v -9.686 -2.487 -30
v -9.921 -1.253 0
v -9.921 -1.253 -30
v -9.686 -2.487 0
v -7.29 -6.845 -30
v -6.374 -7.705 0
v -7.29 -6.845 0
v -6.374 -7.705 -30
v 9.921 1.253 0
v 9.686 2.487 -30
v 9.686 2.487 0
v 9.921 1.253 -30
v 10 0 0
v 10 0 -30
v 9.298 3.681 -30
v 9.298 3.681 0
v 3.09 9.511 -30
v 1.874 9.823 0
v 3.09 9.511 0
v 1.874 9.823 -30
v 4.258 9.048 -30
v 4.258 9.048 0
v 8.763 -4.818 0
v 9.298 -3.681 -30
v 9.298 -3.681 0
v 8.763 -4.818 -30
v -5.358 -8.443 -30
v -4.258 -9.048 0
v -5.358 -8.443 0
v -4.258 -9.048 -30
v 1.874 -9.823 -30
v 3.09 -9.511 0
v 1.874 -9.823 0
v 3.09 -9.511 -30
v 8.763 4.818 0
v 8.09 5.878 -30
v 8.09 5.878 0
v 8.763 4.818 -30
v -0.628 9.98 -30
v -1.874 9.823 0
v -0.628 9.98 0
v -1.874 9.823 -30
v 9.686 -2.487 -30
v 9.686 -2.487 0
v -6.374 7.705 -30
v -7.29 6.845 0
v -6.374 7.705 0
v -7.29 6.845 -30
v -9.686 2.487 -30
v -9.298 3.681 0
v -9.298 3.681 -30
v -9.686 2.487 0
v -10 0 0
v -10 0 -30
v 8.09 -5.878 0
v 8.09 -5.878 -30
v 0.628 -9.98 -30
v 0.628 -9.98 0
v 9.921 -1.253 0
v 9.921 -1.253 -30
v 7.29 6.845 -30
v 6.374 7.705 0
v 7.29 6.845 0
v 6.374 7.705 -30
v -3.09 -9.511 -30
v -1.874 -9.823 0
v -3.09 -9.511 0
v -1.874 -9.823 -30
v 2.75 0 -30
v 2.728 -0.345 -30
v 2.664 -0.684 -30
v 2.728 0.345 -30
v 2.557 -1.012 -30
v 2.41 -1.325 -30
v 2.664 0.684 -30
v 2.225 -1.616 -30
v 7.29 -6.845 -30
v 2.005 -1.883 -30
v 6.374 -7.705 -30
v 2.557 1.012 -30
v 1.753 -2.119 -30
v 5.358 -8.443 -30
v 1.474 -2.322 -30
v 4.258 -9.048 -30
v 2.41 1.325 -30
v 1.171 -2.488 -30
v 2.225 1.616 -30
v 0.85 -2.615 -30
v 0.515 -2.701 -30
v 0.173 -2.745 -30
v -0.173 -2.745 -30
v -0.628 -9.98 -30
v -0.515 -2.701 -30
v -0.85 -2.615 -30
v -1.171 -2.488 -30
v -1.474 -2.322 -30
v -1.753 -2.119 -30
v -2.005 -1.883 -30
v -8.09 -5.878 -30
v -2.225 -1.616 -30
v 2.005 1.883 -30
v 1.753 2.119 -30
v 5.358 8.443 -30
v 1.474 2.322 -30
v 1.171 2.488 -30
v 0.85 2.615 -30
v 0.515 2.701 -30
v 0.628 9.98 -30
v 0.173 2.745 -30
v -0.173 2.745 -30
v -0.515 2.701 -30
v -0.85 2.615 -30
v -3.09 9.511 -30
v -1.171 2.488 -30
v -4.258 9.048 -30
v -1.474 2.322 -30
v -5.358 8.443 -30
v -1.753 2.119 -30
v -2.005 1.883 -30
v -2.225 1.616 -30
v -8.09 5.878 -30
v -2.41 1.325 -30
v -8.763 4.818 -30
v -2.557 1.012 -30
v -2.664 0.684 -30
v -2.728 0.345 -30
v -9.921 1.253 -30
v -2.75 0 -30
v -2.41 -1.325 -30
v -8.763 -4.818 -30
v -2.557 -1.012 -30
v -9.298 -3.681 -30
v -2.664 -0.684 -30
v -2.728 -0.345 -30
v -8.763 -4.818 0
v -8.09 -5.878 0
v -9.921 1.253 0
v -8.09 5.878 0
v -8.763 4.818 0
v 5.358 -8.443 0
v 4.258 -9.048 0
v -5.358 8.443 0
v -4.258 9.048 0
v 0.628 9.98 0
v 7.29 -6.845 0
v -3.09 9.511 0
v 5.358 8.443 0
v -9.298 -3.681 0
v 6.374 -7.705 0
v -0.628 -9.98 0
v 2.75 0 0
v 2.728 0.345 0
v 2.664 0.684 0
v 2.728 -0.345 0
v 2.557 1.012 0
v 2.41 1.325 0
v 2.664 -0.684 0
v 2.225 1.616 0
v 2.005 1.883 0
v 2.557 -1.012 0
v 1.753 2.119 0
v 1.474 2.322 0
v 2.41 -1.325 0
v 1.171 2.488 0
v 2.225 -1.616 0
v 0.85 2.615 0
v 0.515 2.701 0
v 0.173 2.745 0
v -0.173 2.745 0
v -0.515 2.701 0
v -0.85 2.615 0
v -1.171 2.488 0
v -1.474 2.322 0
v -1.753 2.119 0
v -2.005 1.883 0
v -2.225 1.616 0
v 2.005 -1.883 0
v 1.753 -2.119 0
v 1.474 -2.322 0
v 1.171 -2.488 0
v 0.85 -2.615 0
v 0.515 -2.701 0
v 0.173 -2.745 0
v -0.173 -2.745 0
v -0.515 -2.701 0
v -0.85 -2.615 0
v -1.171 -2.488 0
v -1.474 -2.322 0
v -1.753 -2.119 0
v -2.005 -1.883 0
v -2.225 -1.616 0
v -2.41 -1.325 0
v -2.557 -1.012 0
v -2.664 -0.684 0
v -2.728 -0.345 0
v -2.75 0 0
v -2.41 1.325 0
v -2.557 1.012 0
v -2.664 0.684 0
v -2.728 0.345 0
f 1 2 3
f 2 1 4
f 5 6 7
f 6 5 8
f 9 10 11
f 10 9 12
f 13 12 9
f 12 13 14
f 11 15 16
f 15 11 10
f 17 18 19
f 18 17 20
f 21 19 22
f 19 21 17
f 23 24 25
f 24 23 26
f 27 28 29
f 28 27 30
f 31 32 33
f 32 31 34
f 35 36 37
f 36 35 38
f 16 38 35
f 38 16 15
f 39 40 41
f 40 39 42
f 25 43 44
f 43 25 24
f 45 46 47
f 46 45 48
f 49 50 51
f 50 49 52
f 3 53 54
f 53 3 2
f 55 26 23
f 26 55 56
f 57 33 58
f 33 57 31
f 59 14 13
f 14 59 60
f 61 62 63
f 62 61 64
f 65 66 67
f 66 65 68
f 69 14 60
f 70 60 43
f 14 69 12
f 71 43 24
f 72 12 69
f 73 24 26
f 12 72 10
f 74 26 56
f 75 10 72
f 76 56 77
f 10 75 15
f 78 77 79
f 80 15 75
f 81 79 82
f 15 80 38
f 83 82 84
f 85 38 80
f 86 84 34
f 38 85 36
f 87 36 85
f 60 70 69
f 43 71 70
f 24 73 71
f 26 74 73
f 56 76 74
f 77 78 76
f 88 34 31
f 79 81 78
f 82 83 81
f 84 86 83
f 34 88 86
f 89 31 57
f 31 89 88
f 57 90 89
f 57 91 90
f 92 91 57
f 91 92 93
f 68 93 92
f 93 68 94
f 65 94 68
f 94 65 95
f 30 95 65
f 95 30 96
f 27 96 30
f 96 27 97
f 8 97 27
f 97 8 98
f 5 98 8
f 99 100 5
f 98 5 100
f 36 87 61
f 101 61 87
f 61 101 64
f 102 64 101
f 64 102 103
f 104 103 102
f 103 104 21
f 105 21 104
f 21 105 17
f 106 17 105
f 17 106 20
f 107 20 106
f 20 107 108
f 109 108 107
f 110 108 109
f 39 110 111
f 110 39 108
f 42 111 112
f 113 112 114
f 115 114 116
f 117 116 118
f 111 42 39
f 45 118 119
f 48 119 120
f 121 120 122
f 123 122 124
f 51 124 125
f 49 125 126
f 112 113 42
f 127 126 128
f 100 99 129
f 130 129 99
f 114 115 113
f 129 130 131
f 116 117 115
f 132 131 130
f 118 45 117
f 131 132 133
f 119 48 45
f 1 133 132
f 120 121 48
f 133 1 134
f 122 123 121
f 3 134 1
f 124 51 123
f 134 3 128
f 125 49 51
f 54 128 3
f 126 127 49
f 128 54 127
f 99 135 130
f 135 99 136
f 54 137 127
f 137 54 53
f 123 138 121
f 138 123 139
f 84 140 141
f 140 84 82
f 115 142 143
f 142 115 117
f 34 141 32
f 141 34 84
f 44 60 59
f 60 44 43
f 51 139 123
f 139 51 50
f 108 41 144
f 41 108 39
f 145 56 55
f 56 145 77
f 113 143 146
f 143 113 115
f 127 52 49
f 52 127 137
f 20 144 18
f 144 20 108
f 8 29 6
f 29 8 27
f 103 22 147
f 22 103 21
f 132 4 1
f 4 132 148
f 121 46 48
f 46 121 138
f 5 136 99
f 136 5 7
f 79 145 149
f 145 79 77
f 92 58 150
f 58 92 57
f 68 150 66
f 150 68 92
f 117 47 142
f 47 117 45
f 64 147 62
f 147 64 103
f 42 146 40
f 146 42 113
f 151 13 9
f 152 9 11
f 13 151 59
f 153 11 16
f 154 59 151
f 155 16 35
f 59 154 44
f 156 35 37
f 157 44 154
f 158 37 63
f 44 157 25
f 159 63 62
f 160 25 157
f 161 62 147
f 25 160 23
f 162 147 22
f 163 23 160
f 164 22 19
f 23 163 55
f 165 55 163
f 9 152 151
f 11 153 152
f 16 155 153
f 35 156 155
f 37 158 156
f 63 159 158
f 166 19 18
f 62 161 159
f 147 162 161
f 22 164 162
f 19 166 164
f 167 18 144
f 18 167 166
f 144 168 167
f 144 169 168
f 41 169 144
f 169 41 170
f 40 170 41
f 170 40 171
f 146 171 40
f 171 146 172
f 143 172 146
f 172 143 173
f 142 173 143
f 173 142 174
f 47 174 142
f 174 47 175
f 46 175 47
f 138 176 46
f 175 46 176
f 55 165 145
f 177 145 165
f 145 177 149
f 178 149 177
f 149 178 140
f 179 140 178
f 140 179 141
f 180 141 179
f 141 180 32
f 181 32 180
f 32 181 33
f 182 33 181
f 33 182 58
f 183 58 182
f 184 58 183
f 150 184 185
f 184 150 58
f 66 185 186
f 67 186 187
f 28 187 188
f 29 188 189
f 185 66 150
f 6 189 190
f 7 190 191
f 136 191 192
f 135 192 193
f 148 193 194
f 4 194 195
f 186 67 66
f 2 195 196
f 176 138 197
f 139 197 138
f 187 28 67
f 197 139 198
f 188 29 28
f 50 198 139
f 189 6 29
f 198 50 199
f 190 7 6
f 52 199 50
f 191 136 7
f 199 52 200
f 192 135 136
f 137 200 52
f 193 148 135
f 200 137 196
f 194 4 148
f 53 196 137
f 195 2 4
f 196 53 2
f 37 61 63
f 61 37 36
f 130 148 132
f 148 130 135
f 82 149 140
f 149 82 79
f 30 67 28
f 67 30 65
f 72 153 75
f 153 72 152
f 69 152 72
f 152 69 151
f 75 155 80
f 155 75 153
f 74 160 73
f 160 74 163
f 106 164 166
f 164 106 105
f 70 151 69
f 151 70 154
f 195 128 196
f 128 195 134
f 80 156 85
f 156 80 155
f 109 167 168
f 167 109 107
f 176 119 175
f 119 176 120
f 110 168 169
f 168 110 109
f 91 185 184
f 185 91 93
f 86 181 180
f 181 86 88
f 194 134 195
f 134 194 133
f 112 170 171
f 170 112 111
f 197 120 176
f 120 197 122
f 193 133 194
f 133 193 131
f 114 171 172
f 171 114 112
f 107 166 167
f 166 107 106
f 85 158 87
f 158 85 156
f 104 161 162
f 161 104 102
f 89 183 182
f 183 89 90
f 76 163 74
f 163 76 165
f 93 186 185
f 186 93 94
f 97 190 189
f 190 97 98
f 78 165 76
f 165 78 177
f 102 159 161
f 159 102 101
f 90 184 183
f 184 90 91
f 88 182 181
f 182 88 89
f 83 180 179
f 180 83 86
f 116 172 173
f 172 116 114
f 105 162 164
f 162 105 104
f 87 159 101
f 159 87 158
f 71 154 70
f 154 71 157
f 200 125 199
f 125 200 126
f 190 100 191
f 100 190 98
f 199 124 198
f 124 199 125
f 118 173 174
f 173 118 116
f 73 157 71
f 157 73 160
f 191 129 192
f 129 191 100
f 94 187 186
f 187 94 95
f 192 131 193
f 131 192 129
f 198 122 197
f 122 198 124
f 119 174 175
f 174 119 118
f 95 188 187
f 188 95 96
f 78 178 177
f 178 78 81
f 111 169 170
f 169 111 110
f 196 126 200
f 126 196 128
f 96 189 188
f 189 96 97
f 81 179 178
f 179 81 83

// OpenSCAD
$fn = 50;


difference() {
	union() {
		translate(v = [0, 0, -30.0000000000]) {
			cylinder(h = 30, r = 10.0000000000);
		}
		cylinder(h = 0, r = 16.0000000000);
	}
	union() {
		#translate(v = [0, 0, -30]) {
			cylinder(h = 30, r = 2.7500000000);
		}
	}
}
